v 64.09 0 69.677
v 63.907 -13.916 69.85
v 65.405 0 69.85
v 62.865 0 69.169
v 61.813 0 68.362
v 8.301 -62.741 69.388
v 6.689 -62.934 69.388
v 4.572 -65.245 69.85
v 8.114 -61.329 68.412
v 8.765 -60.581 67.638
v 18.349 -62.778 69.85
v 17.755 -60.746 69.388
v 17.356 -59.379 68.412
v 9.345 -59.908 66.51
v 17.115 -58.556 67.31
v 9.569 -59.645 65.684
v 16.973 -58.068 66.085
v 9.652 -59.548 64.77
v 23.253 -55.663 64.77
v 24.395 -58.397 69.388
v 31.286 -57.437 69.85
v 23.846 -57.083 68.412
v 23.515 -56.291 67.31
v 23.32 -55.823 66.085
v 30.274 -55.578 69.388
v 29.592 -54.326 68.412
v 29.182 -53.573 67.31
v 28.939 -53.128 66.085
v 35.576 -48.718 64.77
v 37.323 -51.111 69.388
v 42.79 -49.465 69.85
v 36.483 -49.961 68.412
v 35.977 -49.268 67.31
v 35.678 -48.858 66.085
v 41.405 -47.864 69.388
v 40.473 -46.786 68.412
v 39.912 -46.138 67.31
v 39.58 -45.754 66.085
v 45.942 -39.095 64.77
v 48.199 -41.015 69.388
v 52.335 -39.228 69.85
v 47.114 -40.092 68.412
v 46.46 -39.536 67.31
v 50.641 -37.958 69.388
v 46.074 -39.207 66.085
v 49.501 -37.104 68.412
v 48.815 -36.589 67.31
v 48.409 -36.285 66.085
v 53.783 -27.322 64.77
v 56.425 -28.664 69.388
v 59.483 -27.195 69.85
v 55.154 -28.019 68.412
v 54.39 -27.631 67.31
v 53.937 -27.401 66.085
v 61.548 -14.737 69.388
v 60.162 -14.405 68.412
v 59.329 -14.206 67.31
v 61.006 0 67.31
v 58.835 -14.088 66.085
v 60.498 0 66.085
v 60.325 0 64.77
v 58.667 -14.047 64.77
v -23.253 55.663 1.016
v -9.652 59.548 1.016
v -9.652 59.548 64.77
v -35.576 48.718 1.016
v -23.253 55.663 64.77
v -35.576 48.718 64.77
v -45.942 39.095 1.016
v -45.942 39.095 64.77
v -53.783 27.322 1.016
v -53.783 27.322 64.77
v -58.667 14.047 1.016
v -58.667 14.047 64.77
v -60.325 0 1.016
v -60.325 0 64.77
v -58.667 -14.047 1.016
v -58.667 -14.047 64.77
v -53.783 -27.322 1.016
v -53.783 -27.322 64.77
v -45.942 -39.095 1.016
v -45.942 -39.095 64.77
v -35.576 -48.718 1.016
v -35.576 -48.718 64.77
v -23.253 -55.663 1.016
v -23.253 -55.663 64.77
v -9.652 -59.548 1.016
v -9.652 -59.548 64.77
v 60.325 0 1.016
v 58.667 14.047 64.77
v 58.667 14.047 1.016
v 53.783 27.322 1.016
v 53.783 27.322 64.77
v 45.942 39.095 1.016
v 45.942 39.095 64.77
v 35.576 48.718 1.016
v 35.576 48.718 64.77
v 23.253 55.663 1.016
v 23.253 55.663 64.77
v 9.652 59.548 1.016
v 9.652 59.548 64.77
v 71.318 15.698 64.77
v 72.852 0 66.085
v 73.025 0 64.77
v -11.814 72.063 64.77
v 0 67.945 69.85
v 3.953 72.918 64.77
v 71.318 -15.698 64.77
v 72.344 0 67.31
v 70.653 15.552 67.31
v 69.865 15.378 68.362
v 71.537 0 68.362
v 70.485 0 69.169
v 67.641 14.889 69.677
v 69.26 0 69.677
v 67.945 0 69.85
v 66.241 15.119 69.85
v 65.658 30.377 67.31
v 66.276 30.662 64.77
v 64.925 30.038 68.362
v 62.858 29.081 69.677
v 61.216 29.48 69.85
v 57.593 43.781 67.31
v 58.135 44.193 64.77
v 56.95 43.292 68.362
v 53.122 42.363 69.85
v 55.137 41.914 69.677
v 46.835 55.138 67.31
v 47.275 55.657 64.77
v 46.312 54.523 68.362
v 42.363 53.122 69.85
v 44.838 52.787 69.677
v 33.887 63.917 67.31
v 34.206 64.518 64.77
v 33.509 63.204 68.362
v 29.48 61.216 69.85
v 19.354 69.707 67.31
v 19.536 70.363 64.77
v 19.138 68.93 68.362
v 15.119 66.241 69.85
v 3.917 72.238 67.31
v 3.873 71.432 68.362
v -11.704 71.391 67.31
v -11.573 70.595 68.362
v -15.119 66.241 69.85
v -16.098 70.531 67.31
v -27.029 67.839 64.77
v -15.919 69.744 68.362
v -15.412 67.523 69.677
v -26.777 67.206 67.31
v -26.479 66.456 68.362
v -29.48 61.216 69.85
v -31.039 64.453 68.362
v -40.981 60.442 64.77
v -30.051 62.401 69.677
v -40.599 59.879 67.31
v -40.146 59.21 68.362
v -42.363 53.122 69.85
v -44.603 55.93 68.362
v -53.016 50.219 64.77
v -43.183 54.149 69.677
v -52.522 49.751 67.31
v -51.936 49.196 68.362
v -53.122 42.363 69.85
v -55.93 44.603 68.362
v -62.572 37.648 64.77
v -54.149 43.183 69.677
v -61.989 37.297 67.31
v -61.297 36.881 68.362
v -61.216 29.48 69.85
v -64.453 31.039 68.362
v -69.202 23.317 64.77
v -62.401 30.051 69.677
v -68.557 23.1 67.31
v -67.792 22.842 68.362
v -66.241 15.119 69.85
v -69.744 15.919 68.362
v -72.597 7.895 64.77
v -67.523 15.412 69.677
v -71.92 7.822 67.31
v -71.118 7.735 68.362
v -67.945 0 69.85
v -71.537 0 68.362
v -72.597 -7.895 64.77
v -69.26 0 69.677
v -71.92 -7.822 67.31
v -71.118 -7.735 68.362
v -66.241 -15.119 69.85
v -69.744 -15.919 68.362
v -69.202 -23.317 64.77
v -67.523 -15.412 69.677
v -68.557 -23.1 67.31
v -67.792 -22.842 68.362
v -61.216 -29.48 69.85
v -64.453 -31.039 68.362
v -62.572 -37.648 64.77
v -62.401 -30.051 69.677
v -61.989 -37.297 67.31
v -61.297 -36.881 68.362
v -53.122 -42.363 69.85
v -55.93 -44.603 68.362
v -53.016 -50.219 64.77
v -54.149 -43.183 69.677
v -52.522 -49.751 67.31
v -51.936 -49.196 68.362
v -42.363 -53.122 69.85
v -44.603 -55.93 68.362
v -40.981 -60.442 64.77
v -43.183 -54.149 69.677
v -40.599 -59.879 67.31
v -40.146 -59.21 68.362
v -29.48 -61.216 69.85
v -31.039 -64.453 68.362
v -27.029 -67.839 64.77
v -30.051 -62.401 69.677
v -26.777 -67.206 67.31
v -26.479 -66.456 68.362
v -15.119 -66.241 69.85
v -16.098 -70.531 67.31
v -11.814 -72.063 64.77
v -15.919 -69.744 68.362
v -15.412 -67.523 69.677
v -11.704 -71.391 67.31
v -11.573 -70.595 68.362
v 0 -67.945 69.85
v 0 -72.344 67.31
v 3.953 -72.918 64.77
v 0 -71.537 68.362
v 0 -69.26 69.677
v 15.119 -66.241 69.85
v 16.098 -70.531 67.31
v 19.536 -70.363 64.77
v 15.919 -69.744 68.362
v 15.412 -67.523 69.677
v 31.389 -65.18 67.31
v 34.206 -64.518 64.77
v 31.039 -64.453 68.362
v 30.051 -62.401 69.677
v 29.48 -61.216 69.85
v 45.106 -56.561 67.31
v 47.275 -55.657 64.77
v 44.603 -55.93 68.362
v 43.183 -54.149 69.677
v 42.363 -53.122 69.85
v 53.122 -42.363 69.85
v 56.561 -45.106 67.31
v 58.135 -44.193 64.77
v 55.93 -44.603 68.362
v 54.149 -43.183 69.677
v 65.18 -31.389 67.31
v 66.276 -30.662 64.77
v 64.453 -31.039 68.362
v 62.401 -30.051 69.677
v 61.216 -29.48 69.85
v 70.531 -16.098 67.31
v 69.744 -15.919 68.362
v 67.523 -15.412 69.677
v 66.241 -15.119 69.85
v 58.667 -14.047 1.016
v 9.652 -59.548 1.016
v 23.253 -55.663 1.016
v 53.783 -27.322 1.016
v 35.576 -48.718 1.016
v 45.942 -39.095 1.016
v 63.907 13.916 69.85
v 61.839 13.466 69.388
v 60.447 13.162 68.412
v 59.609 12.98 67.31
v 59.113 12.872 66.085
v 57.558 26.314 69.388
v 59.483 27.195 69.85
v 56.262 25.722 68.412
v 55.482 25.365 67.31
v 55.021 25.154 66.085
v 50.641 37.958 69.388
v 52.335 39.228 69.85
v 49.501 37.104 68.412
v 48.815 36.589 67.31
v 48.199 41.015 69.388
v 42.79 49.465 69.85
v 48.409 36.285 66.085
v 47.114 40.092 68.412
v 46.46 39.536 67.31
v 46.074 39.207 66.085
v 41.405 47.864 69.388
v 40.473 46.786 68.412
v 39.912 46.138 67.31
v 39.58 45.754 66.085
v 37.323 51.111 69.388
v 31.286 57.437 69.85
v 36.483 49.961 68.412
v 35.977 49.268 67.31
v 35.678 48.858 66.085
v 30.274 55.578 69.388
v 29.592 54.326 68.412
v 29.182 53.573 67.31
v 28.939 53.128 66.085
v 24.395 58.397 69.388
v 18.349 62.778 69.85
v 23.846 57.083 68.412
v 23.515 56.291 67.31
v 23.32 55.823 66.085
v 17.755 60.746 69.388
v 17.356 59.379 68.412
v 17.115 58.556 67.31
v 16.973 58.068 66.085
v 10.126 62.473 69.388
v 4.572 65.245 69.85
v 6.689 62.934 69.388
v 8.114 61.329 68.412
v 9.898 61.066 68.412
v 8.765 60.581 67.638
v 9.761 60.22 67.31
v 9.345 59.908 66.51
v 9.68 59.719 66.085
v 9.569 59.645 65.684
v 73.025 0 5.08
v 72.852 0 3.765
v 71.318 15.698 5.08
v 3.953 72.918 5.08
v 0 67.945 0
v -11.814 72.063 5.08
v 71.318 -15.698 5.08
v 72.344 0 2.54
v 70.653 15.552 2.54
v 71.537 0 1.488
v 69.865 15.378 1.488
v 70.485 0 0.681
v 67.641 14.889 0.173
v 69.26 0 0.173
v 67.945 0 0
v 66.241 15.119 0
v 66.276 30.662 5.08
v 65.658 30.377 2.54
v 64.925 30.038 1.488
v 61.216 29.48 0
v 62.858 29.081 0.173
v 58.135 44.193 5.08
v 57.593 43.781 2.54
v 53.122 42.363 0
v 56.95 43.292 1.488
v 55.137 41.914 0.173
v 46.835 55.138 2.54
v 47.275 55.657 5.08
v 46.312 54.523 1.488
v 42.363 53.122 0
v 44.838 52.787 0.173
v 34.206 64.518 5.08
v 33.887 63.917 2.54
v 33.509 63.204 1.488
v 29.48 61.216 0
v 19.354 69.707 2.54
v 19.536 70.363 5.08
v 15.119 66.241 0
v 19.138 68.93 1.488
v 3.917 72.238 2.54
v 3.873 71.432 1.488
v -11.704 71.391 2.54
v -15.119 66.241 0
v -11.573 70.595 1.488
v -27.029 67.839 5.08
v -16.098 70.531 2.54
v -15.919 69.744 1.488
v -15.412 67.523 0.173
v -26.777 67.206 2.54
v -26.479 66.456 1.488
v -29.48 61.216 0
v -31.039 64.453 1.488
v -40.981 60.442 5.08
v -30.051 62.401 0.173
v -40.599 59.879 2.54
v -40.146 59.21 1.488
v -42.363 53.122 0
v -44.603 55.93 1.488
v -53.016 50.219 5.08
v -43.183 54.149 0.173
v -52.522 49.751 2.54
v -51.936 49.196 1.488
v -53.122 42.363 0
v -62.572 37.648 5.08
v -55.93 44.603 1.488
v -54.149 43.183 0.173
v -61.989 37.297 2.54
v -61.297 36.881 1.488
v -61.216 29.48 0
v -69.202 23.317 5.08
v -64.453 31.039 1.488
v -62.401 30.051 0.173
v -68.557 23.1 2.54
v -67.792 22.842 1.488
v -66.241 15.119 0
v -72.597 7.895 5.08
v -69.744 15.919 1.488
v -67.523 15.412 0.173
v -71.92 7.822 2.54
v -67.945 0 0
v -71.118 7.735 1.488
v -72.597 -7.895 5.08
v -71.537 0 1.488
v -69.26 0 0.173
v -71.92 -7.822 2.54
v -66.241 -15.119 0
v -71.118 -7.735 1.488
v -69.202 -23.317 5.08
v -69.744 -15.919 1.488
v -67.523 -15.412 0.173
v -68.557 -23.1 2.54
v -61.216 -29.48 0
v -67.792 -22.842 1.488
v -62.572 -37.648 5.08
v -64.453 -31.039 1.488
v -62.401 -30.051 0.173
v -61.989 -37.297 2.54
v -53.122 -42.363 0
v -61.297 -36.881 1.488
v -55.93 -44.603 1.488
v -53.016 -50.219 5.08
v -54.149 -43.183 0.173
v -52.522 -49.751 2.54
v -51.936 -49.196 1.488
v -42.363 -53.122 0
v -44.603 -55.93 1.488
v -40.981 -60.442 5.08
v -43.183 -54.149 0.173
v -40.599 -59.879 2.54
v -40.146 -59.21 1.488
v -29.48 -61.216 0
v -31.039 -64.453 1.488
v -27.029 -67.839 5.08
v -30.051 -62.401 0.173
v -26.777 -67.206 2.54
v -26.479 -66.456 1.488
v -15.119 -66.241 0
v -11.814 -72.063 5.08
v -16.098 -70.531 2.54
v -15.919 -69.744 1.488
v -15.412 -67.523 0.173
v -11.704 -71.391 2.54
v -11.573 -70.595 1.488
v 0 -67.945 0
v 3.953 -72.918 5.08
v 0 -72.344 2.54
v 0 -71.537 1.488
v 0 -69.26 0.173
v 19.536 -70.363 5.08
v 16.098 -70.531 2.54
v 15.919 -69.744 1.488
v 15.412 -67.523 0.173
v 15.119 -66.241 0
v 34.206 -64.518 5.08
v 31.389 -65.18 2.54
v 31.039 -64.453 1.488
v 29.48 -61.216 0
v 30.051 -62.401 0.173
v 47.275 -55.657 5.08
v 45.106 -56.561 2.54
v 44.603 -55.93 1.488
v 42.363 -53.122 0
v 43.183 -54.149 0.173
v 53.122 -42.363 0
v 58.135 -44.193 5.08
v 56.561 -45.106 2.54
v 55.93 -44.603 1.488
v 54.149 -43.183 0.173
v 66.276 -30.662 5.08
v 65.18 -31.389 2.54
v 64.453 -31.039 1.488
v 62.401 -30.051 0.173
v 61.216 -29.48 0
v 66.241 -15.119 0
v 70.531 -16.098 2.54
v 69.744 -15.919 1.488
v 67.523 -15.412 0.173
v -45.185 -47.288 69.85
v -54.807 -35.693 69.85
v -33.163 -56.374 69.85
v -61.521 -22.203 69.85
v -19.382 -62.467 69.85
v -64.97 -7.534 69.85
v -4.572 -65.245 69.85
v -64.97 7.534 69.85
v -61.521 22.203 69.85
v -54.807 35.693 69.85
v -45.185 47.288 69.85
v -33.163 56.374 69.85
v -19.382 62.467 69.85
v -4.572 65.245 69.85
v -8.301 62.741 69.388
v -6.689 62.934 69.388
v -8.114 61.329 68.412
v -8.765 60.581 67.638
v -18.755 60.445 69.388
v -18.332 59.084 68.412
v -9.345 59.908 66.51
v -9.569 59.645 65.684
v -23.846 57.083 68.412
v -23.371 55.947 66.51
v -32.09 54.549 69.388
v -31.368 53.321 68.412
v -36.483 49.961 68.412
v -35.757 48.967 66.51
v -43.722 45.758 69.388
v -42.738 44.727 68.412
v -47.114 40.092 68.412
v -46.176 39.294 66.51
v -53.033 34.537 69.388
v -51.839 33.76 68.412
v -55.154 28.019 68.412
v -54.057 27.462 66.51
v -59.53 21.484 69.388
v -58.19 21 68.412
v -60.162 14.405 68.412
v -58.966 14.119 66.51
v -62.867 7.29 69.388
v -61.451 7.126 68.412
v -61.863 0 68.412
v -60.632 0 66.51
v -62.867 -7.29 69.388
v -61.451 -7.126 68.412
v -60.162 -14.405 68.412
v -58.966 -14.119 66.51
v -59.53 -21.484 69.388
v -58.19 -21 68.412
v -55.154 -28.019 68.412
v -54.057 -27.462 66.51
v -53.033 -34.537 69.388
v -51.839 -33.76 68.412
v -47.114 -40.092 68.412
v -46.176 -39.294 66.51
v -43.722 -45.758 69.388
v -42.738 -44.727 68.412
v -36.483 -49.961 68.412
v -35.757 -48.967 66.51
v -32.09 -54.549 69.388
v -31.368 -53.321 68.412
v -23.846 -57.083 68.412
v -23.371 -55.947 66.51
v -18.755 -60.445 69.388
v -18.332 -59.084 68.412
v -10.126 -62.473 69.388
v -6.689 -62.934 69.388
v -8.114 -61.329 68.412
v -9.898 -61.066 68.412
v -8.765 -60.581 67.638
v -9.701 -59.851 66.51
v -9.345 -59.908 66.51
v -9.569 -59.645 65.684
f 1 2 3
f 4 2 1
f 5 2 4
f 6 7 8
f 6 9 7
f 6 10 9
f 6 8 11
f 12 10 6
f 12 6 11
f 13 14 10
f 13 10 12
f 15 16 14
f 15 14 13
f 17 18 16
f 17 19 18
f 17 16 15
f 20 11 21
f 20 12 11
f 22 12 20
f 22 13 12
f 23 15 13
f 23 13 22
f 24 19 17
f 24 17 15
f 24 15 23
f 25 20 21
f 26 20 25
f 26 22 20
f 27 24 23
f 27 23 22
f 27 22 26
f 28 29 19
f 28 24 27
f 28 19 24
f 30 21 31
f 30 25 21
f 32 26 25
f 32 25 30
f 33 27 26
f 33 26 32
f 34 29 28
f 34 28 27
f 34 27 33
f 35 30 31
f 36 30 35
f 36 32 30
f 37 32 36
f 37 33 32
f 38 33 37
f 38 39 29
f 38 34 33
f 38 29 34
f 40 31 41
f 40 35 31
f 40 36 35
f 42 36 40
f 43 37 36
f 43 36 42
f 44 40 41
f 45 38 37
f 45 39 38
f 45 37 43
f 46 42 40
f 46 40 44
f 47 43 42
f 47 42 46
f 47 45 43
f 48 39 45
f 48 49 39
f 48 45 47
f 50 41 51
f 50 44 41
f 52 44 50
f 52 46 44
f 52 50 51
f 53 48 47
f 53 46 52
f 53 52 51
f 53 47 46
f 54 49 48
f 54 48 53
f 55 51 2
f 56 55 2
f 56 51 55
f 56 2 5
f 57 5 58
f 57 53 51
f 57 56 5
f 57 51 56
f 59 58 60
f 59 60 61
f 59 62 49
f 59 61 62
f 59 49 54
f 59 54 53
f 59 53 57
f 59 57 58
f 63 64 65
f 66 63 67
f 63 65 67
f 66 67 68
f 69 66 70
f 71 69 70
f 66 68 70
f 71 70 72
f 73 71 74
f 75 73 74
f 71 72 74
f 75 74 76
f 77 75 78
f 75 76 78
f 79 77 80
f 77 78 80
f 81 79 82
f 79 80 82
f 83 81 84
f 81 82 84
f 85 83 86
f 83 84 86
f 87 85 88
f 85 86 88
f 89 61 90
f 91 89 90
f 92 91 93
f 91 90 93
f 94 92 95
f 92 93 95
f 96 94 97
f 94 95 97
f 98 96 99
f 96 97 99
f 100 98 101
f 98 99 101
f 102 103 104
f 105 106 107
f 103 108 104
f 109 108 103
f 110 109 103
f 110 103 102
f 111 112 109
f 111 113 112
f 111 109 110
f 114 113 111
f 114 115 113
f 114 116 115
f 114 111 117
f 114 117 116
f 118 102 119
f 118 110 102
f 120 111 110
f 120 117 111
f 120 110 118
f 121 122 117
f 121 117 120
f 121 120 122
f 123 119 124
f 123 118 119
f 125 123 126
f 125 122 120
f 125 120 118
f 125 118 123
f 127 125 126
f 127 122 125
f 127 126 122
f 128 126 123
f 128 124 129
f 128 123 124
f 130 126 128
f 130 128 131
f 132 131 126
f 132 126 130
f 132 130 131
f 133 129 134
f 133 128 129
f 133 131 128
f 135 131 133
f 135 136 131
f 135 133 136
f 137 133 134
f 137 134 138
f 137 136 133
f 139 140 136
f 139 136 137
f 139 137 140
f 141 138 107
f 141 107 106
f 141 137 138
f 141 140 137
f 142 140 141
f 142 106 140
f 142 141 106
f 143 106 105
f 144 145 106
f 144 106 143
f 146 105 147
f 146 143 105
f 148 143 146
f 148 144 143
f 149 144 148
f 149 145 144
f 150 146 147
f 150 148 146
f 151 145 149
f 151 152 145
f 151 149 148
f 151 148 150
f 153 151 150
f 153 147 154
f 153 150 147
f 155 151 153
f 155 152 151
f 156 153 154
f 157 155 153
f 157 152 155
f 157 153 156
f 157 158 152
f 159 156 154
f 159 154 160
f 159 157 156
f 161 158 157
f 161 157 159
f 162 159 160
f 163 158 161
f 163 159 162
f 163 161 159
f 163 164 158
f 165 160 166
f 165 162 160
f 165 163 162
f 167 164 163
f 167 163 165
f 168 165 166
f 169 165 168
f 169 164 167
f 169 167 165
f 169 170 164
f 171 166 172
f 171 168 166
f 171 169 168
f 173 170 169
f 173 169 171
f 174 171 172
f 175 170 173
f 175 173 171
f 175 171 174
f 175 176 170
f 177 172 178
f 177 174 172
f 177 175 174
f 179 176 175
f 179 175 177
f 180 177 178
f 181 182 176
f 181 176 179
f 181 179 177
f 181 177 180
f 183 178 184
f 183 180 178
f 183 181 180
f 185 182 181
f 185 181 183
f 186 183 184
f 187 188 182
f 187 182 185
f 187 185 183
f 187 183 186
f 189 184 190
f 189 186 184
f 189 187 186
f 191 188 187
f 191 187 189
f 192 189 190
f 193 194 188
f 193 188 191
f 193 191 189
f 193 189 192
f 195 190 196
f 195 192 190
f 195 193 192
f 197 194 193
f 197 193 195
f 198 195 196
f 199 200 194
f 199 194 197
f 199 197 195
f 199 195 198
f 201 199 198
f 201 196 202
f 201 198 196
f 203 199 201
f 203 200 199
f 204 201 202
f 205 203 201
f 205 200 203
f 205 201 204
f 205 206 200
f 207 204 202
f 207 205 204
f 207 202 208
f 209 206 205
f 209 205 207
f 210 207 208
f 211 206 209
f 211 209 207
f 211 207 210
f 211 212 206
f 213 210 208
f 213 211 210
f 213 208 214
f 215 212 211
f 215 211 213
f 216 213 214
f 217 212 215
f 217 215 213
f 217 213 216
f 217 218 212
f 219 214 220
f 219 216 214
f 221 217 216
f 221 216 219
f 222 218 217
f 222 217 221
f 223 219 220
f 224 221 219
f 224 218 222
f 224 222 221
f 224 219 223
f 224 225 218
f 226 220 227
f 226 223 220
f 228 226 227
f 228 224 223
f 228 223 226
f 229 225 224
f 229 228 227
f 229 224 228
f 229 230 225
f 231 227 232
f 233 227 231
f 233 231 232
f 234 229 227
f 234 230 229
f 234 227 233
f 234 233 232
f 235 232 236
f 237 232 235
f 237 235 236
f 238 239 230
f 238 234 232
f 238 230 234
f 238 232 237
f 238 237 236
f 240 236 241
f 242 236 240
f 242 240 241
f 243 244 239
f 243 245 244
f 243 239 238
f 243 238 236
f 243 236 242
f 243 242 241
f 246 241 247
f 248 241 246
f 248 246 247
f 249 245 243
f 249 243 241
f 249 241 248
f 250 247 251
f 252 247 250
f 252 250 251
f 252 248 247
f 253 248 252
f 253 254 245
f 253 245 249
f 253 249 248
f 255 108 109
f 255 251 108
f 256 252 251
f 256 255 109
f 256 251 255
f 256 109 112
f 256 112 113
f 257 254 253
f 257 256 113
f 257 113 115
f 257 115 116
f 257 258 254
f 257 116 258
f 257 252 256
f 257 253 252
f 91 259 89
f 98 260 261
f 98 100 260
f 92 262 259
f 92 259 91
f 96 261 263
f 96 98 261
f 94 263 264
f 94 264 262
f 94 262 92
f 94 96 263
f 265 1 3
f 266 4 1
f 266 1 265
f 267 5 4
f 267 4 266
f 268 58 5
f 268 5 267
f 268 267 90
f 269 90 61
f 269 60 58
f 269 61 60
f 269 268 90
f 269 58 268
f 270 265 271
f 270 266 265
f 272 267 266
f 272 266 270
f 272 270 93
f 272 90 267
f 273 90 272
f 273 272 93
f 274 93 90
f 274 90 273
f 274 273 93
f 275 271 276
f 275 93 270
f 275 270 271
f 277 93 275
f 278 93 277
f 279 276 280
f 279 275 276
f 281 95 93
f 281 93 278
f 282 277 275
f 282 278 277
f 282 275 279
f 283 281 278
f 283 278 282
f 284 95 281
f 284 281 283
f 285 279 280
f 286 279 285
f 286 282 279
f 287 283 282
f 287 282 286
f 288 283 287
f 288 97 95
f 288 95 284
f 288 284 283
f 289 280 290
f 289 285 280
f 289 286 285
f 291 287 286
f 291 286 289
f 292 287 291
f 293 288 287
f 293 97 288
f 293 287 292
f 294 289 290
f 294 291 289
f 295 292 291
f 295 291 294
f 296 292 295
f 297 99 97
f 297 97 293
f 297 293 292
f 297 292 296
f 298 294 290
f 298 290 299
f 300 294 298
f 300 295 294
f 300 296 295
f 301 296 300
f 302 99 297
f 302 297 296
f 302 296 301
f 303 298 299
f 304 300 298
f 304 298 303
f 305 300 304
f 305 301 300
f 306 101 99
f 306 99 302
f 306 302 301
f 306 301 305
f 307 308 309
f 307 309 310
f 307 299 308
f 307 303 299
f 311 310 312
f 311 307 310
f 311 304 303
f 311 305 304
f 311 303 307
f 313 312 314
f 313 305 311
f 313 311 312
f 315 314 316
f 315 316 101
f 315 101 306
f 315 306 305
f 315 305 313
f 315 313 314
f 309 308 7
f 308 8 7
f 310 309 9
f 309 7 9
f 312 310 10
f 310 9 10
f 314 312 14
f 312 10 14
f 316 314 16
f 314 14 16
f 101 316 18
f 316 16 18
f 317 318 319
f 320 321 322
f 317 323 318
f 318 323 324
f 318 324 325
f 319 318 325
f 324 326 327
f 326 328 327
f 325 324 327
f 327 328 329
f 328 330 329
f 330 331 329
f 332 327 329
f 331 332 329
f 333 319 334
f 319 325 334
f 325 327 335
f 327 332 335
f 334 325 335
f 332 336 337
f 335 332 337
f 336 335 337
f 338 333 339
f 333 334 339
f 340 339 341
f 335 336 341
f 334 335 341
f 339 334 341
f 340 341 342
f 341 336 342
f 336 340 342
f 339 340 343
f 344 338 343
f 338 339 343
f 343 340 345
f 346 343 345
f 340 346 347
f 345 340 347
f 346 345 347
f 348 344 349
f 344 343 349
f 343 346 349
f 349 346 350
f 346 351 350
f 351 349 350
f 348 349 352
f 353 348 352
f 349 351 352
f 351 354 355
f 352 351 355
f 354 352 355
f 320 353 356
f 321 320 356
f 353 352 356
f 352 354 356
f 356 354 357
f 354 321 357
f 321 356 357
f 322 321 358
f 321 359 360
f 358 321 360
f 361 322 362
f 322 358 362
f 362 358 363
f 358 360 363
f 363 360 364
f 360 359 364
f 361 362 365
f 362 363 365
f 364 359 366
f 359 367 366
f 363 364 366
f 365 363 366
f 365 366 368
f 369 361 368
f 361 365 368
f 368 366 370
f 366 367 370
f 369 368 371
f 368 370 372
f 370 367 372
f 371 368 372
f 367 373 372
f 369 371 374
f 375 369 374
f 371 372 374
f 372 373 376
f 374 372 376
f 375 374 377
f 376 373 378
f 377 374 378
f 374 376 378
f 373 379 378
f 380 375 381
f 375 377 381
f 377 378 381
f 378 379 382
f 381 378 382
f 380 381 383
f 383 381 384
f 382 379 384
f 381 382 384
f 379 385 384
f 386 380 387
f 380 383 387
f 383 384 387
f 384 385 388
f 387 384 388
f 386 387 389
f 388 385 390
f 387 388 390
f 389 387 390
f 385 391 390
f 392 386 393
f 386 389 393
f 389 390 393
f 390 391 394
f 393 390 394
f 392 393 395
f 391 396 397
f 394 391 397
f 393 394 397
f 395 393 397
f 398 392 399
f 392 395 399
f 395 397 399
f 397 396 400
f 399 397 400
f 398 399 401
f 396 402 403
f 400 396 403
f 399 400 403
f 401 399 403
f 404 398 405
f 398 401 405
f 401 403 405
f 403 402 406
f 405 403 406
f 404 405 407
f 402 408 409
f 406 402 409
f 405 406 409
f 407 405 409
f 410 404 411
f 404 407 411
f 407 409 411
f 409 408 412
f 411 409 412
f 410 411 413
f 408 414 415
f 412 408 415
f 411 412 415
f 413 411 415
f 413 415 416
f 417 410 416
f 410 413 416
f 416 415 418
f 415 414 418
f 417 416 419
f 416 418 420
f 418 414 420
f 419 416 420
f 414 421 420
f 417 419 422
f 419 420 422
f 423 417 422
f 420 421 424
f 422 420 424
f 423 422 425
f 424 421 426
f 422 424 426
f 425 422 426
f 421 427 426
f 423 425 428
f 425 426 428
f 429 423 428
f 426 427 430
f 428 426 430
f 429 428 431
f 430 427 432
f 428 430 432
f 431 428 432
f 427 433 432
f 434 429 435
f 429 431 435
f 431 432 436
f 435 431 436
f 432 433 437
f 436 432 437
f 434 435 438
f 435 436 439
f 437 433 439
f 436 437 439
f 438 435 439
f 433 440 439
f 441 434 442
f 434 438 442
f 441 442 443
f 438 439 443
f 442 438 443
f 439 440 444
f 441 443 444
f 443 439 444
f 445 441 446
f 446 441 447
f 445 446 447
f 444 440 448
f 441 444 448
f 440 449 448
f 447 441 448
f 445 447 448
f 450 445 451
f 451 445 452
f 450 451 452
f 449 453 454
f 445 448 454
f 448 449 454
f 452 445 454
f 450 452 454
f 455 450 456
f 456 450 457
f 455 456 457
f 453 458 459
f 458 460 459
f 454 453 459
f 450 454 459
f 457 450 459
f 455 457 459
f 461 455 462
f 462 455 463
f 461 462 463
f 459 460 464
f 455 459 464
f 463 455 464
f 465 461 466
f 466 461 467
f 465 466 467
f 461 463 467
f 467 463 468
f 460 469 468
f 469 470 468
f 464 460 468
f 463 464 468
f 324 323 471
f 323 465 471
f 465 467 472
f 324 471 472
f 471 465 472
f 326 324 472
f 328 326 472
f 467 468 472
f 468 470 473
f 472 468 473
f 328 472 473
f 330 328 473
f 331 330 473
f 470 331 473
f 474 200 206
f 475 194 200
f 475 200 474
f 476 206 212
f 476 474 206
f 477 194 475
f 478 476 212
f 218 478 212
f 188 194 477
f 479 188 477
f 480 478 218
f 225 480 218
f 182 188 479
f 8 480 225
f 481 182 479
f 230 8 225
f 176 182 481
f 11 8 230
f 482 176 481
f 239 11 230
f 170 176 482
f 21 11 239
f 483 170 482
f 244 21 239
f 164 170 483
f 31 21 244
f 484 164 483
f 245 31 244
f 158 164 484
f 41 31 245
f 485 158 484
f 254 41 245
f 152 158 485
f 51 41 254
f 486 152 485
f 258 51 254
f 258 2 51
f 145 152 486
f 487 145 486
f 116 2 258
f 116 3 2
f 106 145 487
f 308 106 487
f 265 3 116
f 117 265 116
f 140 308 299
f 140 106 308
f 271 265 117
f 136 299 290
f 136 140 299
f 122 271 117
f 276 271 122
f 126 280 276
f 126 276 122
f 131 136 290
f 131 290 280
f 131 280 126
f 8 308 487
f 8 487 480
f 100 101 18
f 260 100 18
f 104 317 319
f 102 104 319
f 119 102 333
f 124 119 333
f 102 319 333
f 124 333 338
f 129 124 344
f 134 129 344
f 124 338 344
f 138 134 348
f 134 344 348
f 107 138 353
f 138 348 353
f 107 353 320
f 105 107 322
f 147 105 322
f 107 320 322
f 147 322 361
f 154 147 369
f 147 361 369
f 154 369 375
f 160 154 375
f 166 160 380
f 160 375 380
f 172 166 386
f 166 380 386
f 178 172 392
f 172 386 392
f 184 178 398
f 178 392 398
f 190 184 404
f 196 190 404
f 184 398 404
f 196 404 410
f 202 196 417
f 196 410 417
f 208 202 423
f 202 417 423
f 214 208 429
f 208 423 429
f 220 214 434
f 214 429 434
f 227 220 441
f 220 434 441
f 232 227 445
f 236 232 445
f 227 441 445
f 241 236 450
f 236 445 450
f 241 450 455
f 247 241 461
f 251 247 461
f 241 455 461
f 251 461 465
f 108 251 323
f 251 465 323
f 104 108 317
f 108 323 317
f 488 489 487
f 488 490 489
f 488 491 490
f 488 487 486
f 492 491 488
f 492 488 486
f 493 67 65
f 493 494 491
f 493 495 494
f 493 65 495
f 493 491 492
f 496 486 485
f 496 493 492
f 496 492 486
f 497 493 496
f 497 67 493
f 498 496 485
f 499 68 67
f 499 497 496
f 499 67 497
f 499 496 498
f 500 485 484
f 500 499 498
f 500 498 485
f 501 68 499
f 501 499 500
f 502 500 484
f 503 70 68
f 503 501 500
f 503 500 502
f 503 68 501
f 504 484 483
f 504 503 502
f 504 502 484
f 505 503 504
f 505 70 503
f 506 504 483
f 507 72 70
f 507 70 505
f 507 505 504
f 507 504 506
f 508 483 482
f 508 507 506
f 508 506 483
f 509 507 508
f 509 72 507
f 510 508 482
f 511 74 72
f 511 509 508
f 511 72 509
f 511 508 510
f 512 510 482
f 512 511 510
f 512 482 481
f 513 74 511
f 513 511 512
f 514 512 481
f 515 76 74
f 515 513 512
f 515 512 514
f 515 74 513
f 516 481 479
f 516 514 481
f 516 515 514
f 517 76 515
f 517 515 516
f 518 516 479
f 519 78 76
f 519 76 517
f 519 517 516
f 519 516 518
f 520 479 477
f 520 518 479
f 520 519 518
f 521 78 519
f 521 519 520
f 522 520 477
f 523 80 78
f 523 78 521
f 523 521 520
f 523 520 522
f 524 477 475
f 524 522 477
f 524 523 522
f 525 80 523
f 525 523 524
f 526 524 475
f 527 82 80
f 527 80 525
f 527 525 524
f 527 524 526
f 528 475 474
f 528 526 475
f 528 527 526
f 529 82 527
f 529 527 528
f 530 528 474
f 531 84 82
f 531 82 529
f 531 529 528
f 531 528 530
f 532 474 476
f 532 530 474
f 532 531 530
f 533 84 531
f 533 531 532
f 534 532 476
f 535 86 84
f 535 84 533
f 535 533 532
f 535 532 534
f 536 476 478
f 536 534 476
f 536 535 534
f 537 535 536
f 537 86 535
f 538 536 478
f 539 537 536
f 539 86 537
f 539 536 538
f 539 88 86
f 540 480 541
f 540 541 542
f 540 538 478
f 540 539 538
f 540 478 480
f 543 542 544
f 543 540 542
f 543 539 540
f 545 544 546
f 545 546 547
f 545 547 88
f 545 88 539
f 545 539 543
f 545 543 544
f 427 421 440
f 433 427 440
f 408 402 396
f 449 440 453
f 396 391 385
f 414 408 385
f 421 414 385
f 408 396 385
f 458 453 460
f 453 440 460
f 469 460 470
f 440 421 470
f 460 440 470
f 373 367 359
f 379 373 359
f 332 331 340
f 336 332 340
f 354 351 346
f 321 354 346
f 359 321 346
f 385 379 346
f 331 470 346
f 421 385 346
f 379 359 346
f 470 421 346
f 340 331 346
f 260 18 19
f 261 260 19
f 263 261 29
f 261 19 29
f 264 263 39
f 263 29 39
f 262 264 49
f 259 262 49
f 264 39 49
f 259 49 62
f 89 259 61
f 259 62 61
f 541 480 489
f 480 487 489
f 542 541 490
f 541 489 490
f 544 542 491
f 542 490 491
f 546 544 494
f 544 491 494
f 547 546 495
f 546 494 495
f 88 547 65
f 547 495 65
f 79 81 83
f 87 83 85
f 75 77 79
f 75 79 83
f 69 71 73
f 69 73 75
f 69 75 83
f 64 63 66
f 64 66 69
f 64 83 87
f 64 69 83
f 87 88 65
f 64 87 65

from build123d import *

# Parameters (mm, degrees)
F0_R     = 73.025
F1_DEPTH = 69.85
F3_DEPTH = 68.834
F4_R     = 5.08


with BuildPart() as f1:
    # F0 (on Top) → F1 (new body)
    with BuildSketch(Plane.XY):
        Circle(F0_R)
    extrude(amount=F1_DEPTH)

    # F2 (on face) → F3 (cut)
    with BuildSketch(Plane.XY.offset(69.85)):
        with BuildLine():
            Line((-9.652, 0), (-9.652, 59.5478338901))
            ThreePointArc((-9.652, 59.5478338901), (-60.325, 0), (-9.652, -59.5478338901))
            Line((-9.652, -59.5478338901), (-9.652, 0))
        make_face()
        with BuildLine():
            ThreePointArc((9.652, -59.5478338901), (45.9421512611, -39.0950682631), (60.325, 0))
            ThreePointArc((60.325, 0), (45.9421512611, 39.0950682631), (9.652, 59.5478338901))
            Line((9.652, 59.5478338901), (9.652, 0))
            Line((9.652, 0), (9.652, -59.5478338901))
        make_face()
    extrude(amount=-F3_DEPTH, mode=Mode.SUBTRACT)

    # F4
    f4_edges = [f1.edges().sort_by_distance(p)[0] for p in [
        (-73.025, 0, 69.85),
        (9.652, 0, 69.85),
        (60.325, 0, 69.85),
        (-9.652, 0, 69.85),
        (-60.325, 0, 69.85),
        (-73.025, 0, 0),
    ]]
    fillet(f4_edges, radius=F4_R)


solid = f1.part
